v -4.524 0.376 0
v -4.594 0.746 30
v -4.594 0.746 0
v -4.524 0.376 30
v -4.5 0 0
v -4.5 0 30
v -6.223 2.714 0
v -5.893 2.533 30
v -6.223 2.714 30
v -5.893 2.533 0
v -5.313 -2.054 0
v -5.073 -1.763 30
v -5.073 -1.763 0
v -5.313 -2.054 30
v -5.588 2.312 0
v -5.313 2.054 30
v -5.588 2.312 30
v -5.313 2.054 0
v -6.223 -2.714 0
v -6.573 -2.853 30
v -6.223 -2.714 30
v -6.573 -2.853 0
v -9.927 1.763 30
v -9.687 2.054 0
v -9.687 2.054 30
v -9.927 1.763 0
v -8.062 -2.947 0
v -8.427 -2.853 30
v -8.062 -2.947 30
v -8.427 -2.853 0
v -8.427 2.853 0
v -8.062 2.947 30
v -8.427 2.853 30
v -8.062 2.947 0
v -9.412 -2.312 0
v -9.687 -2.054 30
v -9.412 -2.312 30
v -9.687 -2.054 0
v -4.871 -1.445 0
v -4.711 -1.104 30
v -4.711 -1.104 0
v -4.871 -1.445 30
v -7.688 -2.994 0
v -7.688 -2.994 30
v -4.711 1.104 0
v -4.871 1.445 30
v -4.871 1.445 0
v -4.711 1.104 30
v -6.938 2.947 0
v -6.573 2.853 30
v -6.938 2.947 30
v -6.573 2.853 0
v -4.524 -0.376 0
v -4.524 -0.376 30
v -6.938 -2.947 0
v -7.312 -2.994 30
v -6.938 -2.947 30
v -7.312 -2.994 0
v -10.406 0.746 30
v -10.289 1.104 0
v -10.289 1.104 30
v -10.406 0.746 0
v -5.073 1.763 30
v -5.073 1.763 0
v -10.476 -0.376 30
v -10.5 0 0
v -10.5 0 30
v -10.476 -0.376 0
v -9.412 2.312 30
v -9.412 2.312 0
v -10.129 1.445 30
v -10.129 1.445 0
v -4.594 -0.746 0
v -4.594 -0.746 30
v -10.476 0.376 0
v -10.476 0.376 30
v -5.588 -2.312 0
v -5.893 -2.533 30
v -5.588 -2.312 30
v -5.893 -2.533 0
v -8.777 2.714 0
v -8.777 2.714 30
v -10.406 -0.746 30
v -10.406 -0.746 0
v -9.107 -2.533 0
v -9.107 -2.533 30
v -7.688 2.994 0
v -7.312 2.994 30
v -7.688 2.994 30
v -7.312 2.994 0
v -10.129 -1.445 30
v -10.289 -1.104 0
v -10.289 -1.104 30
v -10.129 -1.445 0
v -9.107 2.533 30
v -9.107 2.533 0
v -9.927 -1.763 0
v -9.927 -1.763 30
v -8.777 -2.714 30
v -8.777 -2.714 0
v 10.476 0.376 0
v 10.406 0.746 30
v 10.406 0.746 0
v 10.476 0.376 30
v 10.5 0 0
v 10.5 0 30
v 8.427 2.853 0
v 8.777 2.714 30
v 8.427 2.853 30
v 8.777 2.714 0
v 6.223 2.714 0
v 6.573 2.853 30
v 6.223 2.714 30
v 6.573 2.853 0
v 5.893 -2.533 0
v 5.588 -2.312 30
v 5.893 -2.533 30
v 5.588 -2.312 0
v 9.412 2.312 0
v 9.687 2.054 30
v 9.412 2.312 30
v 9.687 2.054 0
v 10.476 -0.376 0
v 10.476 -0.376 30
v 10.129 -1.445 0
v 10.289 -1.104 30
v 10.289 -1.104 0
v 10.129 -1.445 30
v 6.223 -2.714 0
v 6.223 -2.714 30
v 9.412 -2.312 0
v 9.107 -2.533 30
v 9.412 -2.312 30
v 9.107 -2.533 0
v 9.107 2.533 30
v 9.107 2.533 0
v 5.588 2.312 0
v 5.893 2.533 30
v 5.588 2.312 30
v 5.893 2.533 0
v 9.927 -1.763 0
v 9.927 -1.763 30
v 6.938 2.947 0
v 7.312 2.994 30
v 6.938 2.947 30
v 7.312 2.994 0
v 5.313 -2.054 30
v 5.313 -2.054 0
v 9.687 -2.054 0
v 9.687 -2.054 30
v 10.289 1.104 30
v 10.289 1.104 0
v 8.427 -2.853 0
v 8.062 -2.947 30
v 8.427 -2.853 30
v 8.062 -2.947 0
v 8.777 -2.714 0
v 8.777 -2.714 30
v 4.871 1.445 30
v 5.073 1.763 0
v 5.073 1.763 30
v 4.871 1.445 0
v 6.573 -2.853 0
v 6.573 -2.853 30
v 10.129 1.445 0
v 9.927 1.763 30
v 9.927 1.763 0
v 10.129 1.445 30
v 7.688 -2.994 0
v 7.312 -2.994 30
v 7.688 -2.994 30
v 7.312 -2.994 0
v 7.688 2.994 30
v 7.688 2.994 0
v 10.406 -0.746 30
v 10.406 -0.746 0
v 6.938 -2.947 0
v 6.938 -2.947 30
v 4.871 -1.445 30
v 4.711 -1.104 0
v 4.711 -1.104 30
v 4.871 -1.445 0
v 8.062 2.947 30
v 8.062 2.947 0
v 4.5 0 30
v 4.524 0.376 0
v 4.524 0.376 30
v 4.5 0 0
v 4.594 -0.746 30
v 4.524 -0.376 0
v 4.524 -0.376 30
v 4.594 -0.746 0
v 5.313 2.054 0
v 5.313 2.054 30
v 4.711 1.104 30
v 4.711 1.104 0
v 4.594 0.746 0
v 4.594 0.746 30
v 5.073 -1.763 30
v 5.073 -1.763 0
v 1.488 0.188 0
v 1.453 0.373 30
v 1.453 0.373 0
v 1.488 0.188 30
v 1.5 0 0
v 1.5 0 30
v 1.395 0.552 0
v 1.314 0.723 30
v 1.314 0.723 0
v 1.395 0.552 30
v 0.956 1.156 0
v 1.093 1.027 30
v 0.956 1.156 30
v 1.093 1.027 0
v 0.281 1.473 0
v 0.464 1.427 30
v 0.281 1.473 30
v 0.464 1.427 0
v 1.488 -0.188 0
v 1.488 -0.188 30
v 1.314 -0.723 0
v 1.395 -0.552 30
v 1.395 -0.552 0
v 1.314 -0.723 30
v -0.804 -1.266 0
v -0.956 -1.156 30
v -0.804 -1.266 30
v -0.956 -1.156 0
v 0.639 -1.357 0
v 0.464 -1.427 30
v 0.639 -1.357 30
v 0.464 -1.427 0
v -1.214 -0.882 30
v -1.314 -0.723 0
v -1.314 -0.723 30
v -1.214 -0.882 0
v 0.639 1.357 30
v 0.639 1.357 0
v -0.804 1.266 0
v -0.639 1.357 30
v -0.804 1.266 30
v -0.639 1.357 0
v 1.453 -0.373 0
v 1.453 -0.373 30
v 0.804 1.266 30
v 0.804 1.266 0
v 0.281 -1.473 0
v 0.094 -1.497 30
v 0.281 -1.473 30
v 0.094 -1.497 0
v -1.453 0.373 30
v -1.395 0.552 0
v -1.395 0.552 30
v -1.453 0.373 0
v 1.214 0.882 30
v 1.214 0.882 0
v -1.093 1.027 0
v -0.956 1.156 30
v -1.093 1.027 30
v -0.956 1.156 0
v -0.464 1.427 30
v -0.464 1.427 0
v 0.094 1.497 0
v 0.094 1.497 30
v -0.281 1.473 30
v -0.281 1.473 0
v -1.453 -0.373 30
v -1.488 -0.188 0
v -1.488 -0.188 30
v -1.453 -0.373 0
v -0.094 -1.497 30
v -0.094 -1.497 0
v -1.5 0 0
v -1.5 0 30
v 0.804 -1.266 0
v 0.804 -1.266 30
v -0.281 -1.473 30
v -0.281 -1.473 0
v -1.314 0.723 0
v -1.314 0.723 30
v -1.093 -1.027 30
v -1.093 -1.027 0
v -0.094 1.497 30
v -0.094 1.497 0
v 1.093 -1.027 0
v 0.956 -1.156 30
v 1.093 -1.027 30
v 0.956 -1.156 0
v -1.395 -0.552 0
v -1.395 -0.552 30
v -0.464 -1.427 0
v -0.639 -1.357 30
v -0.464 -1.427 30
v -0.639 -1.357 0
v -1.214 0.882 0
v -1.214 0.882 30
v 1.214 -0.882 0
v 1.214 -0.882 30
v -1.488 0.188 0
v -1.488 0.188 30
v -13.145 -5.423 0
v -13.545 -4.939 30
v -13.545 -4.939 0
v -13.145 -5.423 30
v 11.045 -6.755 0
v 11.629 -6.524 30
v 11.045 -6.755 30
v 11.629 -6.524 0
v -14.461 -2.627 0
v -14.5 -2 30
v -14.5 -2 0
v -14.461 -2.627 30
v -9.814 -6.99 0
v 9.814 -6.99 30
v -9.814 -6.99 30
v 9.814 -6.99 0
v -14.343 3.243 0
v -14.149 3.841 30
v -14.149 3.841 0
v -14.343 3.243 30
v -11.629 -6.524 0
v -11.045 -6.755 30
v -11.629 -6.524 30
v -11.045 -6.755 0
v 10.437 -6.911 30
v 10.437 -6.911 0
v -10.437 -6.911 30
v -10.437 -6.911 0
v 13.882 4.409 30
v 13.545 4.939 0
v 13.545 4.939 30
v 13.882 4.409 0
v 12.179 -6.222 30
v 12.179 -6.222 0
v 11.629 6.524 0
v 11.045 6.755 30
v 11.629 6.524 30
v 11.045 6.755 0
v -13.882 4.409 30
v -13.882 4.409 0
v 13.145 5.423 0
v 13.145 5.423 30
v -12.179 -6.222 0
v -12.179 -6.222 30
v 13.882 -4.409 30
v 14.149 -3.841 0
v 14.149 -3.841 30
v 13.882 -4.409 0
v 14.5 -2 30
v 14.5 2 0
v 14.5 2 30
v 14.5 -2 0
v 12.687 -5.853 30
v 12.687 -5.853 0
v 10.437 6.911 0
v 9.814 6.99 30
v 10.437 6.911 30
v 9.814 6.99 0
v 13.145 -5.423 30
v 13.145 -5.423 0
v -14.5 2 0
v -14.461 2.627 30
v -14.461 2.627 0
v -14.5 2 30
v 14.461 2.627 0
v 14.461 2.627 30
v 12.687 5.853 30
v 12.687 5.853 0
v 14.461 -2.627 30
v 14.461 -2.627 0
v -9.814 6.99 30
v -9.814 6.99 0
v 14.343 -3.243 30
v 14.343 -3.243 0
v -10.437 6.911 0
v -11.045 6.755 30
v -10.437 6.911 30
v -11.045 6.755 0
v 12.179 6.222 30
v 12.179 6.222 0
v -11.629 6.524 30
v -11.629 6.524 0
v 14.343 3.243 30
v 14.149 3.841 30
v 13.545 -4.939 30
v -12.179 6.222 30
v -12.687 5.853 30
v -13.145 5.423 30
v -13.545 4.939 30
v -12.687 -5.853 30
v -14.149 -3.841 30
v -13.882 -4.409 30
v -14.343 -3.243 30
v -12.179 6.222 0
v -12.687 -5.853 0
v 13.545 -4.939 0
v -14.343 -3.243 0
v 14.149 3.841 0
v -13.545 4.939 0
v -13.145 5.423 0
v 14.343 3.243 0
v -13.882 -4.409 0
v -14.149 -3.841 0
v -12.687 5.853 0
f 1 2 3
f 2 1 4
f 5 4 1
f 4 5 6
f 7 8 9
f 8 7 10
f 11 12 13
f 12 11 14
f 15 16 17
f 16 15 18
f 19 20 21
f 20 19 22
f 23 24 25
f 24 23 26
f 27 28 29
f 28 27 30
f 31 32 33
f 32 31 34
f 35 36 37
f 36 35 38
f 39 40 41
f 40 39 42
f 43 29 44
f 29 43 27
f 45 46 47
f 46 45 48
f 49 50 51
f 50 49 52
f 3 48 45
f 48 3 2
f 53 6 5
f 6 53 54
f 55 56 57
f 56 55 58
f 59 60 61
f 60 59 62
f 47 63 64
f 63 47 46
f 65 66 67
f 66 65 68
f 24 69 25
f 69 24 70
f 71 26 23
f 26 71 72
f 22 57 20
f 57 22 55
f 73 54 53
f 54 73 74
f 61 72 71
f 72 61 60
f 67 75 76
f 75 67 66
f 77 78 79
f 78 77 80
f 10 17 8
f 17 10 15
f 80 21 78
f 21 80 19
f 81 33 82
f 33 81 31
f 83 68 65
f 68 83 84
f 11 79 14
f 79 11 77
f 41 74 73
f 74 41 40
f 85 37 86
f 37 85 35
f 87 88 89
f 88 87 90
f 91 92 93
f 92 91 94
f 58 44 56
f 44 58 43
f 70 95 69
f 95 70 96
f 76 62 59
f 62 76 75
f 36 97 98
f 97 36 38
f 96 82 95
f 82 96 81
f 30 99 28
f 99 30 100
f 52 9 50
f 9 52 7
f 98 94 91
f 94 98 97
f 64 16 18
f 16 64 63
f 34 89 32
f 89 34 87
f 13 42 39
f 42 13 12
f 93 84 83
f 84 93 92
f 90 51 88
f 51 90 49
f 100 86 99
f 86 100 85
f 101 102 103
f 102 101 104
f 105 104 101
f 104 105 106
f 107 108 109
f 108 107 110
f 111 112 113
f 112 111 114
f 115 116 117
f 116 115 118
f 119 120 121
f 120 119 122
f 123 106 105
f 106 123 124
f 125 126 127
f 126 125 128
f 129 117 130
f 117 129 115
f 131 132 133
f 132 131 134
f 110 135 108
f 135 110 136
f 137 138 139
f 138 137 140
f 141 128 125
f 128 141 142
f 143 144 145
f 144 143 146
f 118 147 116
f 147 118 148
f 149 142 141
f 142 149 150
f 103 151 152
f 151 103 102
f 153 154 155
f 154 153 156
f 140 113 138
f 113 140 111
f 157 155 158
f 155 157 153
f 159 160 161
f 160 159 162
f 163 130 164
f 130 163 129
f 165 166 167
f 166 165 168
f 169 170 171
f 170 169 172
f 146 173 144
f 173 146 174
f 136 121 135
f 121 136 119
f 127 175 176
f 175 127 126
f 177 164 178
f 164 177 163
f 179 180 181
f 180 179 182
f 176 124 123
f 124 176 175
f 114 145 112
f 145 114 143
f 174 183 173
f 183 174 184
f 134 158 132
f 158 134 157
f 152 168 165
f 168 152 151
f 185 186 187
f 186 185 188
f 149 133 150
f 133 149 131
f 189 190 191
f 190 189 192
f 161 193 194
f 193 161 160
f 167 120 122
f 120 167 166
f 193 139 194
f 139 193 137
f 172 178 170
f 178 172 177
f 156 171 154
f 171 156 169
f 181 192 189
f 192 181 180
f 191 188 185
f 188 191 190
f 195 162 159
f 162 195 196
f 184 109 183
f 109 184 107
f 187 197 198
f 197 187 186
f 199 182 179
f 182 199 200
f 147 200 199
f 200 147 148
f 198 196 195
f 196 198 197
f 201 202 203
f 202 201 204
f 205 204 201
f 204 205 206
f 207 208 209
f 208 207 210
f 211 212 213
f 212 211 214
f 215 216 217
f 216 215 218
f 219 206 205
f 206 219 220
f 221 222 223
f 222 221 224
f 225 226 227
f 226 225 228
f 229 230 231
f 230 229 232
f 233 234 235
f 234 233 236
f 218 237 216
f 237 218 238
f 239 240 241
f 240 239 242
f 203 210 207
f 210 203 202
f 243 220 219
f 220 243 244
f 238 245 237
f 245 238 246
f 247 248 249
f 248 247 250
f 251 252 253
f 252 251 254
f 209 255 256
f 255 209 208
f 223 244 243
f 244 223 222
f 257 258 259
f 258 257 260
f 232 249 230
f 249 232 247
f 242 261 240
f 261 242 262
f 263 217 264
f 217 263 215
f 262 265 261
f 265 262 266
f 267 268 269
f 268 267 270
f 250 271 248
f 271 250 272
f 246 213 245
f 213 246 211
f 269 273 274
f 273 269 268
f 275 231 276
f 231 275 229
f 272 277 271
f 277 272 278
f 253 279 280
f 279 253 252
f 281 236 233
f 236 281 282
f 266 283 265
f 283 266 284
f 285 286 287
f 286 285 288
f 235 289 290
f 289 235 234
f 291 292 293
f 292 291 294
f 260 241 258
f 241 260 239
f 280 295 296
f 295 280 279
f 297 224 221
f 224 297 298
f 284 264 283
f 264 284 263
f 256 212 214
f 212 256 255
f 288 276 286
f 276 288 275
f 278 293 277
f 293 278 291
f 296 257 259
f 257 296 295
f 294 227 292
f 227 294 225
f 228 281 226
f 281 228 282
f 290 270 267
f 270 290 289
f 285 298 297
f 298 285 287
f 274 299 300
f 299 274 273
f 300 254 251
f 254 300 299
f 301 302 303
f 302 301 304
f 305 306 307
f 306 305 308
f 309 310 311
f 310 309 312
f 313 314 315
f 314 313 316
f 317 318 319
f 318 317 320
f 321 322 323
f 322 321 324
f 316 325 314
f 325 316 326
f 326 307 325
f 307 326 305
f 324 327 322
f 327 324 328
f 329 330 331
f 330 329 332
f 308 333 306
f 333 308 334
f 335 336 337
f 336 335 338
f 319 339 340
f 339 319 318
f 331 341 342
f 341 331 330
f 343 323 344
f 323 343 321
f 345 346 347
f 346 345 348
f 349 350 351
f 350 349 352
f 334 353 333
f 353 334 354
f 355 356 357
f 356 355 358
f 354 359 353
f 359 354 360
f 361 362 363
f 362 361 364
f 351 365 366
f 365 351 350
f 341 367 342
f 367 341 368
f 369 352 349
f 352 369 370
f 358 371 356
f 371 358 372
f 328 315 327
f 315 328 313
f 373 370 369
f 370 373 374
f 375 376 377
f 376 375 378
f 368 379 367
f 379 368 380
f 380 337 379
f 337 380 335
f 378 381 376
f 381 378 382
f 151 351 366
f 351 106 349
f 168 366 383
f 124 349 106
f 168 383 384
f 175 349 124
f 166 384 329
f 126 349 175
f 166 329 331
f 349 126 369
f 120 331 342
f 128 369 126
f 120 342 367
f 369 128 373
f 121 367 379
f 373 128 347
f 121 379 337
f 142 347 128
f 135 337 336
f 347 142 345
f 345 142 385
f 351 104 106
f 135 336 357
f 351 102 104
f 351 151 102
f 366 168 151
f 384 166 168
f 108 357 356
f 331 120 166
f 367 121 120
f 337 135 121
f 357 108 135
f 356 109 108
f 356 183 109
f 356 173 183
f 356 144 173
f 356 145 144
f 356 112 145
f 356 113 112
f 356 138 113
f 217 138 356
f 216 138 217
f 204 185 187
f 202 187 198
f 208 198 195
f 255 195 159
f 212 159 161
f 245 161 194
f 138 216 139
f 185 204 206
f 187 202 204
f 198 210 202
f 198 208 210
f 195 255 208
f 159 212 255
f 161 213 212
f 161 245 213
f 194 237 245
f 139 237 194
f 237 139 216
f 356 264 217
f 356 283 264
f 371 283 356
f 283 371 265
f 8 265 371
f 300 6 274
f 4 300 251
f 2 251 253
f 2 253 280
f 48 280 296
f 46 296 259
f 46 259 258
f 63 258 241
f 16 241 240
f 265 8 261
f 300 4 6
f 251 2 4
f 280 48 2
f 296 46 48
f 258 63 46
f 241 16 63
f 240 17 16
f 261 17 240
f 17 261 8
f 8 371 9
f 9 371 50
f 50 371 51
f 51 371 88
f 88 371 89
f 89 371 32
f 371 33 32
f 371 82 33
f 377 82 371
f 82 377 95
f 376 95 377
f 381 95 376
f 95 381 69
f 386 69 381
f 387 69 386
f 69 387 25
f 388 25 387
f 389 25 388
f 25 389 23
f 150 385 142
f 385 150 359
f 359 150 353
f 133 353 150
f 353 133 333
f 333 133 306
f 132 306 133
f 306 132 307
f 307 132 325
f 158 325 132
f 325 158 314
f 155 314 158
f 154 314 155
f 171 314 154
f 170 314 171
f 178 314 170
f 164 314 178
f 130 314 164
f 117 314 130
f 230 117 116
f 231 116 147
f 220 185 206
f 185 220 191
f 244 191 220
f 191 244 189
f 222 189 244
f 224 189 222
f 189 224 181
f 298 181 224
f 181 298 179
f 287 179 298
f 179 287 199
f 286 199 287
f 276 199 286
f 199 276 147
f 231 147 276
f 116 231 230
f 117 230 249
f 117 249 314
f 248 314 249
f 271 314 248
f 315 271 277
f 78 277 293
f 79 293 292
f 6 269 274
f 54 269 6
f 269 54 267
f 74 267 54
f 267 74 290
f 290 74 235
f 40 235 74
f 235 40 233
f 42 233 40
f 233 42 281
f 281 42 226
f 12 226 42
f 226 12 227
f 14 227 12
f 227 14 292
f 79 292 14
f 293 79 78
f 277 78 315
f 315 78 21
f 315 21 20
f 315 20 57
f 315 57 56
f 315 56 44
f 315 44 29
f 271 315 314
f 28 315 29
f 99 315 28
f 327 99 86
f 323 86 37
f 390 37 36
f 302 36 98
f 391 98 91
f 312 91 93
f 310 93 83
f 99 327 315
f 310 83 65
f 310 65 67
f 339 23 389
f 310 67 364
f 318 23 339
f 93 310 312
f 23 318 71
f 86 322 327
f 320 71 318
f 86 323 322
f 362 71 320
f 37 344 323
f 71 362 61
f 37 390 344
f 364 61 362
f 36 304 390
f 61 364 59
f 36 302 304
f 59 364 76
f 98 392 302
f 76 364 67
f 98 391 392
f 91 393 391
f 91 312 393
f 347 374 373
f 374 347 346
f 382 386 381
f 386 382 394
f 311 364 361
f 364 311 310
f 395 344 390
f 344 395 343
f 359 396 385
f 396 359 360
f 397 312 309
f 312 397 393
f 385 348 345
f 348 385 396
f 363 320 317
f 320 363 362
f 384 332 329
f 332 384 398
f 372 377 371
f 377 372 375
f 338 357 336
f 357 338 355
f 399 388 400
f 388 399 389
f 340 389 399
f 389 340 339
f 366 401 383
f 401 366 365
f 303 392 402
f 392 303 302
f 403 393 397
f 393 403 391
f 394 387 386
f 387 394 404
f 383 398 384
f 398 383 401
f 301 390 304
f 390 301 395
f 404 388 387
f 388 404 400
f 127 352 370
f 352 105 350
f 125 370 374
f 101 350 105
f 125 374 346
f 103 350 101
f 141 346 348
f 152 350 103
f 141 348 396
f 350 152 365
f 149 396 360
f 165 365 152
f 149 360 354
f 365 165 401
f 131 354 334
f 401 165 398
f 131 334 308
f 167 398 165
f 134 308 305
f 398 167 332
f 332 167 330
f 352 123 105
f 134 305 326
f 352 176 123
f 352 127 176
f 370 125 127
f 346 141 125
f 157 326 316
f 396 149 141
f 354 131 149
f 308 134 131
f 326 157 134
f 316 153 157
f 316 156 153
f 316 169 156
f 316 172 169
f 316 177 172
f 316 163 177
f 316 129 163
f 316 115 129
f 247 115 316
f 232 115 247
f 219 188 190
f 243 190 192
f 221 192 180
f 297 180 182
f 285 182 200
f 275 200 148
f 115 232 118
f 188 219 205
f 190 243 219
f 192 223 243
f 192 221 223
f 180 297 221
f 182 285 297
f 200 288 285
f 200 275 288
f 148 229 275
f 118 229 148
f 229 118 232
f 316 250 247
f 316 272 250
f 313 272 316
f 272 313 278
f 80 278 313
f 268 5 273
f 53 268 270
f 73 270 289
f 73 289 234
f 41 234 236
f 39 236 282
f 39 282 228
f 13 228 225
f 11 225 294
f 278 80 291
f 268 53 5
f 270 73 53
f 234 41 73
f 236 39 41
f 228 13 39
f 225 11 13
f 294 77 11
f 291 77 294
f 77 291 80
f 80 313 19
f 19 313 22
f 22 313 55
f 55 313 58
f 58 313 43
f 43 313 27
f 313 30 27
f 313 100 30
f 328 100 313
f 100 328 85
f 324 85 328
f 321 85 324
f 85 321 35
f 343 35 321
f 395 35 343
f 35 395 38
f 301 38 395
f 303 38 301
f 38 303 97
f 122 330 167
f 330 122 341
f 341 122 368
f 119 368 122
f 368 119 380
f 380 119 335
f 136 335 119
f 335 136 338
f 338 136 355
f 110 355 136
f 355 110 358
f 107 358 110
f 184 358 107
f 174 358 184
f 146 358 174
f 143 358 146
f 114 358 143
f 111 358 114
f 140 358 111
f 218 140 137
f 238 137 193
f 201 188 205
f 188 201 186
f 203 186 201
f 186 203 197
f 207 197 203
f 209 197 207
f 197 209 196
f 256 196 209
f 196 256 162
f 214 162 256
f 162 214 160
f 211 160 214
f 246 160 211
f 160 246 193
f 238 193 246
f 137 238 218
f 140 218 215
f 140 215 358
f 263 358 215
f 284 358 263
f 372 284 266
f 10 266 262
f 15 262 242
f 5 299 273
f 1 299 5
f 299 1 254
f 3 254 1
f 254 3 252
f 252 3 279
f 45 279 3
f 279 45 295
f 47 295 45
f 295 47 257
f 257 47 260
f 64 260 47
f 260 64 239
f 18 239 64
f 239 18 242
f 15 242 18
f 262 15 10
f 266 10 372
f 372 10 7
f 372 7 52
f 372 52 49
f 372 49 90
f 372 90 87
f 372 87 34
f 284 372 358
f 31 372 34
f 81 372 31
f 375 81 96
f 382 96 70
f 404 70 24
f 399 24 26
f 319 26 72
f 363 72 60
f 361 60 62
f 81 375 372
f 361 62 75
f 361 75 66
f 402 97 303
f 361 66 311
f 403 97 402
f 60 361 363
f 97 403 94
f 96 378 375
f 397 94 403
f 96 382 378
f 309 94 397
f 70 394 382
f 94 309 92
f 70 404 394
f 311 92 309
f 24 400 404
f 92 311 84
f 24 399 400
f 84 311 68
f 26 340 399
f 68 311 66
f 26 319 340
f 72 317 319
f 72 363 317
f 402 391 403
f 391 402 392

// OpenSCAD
$fn = 50;


difference() {
	union() {
		hull() {
			translate(v = [-9.5000000000, 2.0000000000, 0]) {
				cylinder(h = 30, r = 5);
			}
			translate(v = [9.5000000000, 2.0000000000, 0]) {
				cylinder(h = 30, r = 5);
			}
			translate(v = [-9.5000000000, -2.0000000000, 0]) {
				cylinder(h = 30, r = 5);
			}
			translate(v = [9.5000000000, -2.0000000000, 0]) {
				cylinder(h = 30, r = 5);
			}
		}
	}
	union() {
		translate(v = [-7.5000000000, 0.0000000000, 0]) {
			translate(v = [0, 0, -100]) {
				cylinder(h = 200, r = 3.0000000000);
			}
		}
		translate(v = [7.5000000000, 0.0000000000, 0]) {
			translate(v = [0, 0, -100]) {
				cylinder(h = 200, r = 3.0000000000);
			}
		}
		translate(v = [-7.5000000000, 0.0000000000, 0]) {
			translate(v = [0, 0, -100]) {
				cylinder(h = 200, r = 1.5000000000);
			}
		}
		translate(v = [0, 0, -100]) {
			cylinder(h = 200, r = 1.5000000000);
		}
		translate(v = [7.5000000000, 0.0000000000, 0]) {
			translate(v = [0, 0, -100]) {
				cylinder(h = 200, r = 1.5000000000);
			}
		}
	}
}
